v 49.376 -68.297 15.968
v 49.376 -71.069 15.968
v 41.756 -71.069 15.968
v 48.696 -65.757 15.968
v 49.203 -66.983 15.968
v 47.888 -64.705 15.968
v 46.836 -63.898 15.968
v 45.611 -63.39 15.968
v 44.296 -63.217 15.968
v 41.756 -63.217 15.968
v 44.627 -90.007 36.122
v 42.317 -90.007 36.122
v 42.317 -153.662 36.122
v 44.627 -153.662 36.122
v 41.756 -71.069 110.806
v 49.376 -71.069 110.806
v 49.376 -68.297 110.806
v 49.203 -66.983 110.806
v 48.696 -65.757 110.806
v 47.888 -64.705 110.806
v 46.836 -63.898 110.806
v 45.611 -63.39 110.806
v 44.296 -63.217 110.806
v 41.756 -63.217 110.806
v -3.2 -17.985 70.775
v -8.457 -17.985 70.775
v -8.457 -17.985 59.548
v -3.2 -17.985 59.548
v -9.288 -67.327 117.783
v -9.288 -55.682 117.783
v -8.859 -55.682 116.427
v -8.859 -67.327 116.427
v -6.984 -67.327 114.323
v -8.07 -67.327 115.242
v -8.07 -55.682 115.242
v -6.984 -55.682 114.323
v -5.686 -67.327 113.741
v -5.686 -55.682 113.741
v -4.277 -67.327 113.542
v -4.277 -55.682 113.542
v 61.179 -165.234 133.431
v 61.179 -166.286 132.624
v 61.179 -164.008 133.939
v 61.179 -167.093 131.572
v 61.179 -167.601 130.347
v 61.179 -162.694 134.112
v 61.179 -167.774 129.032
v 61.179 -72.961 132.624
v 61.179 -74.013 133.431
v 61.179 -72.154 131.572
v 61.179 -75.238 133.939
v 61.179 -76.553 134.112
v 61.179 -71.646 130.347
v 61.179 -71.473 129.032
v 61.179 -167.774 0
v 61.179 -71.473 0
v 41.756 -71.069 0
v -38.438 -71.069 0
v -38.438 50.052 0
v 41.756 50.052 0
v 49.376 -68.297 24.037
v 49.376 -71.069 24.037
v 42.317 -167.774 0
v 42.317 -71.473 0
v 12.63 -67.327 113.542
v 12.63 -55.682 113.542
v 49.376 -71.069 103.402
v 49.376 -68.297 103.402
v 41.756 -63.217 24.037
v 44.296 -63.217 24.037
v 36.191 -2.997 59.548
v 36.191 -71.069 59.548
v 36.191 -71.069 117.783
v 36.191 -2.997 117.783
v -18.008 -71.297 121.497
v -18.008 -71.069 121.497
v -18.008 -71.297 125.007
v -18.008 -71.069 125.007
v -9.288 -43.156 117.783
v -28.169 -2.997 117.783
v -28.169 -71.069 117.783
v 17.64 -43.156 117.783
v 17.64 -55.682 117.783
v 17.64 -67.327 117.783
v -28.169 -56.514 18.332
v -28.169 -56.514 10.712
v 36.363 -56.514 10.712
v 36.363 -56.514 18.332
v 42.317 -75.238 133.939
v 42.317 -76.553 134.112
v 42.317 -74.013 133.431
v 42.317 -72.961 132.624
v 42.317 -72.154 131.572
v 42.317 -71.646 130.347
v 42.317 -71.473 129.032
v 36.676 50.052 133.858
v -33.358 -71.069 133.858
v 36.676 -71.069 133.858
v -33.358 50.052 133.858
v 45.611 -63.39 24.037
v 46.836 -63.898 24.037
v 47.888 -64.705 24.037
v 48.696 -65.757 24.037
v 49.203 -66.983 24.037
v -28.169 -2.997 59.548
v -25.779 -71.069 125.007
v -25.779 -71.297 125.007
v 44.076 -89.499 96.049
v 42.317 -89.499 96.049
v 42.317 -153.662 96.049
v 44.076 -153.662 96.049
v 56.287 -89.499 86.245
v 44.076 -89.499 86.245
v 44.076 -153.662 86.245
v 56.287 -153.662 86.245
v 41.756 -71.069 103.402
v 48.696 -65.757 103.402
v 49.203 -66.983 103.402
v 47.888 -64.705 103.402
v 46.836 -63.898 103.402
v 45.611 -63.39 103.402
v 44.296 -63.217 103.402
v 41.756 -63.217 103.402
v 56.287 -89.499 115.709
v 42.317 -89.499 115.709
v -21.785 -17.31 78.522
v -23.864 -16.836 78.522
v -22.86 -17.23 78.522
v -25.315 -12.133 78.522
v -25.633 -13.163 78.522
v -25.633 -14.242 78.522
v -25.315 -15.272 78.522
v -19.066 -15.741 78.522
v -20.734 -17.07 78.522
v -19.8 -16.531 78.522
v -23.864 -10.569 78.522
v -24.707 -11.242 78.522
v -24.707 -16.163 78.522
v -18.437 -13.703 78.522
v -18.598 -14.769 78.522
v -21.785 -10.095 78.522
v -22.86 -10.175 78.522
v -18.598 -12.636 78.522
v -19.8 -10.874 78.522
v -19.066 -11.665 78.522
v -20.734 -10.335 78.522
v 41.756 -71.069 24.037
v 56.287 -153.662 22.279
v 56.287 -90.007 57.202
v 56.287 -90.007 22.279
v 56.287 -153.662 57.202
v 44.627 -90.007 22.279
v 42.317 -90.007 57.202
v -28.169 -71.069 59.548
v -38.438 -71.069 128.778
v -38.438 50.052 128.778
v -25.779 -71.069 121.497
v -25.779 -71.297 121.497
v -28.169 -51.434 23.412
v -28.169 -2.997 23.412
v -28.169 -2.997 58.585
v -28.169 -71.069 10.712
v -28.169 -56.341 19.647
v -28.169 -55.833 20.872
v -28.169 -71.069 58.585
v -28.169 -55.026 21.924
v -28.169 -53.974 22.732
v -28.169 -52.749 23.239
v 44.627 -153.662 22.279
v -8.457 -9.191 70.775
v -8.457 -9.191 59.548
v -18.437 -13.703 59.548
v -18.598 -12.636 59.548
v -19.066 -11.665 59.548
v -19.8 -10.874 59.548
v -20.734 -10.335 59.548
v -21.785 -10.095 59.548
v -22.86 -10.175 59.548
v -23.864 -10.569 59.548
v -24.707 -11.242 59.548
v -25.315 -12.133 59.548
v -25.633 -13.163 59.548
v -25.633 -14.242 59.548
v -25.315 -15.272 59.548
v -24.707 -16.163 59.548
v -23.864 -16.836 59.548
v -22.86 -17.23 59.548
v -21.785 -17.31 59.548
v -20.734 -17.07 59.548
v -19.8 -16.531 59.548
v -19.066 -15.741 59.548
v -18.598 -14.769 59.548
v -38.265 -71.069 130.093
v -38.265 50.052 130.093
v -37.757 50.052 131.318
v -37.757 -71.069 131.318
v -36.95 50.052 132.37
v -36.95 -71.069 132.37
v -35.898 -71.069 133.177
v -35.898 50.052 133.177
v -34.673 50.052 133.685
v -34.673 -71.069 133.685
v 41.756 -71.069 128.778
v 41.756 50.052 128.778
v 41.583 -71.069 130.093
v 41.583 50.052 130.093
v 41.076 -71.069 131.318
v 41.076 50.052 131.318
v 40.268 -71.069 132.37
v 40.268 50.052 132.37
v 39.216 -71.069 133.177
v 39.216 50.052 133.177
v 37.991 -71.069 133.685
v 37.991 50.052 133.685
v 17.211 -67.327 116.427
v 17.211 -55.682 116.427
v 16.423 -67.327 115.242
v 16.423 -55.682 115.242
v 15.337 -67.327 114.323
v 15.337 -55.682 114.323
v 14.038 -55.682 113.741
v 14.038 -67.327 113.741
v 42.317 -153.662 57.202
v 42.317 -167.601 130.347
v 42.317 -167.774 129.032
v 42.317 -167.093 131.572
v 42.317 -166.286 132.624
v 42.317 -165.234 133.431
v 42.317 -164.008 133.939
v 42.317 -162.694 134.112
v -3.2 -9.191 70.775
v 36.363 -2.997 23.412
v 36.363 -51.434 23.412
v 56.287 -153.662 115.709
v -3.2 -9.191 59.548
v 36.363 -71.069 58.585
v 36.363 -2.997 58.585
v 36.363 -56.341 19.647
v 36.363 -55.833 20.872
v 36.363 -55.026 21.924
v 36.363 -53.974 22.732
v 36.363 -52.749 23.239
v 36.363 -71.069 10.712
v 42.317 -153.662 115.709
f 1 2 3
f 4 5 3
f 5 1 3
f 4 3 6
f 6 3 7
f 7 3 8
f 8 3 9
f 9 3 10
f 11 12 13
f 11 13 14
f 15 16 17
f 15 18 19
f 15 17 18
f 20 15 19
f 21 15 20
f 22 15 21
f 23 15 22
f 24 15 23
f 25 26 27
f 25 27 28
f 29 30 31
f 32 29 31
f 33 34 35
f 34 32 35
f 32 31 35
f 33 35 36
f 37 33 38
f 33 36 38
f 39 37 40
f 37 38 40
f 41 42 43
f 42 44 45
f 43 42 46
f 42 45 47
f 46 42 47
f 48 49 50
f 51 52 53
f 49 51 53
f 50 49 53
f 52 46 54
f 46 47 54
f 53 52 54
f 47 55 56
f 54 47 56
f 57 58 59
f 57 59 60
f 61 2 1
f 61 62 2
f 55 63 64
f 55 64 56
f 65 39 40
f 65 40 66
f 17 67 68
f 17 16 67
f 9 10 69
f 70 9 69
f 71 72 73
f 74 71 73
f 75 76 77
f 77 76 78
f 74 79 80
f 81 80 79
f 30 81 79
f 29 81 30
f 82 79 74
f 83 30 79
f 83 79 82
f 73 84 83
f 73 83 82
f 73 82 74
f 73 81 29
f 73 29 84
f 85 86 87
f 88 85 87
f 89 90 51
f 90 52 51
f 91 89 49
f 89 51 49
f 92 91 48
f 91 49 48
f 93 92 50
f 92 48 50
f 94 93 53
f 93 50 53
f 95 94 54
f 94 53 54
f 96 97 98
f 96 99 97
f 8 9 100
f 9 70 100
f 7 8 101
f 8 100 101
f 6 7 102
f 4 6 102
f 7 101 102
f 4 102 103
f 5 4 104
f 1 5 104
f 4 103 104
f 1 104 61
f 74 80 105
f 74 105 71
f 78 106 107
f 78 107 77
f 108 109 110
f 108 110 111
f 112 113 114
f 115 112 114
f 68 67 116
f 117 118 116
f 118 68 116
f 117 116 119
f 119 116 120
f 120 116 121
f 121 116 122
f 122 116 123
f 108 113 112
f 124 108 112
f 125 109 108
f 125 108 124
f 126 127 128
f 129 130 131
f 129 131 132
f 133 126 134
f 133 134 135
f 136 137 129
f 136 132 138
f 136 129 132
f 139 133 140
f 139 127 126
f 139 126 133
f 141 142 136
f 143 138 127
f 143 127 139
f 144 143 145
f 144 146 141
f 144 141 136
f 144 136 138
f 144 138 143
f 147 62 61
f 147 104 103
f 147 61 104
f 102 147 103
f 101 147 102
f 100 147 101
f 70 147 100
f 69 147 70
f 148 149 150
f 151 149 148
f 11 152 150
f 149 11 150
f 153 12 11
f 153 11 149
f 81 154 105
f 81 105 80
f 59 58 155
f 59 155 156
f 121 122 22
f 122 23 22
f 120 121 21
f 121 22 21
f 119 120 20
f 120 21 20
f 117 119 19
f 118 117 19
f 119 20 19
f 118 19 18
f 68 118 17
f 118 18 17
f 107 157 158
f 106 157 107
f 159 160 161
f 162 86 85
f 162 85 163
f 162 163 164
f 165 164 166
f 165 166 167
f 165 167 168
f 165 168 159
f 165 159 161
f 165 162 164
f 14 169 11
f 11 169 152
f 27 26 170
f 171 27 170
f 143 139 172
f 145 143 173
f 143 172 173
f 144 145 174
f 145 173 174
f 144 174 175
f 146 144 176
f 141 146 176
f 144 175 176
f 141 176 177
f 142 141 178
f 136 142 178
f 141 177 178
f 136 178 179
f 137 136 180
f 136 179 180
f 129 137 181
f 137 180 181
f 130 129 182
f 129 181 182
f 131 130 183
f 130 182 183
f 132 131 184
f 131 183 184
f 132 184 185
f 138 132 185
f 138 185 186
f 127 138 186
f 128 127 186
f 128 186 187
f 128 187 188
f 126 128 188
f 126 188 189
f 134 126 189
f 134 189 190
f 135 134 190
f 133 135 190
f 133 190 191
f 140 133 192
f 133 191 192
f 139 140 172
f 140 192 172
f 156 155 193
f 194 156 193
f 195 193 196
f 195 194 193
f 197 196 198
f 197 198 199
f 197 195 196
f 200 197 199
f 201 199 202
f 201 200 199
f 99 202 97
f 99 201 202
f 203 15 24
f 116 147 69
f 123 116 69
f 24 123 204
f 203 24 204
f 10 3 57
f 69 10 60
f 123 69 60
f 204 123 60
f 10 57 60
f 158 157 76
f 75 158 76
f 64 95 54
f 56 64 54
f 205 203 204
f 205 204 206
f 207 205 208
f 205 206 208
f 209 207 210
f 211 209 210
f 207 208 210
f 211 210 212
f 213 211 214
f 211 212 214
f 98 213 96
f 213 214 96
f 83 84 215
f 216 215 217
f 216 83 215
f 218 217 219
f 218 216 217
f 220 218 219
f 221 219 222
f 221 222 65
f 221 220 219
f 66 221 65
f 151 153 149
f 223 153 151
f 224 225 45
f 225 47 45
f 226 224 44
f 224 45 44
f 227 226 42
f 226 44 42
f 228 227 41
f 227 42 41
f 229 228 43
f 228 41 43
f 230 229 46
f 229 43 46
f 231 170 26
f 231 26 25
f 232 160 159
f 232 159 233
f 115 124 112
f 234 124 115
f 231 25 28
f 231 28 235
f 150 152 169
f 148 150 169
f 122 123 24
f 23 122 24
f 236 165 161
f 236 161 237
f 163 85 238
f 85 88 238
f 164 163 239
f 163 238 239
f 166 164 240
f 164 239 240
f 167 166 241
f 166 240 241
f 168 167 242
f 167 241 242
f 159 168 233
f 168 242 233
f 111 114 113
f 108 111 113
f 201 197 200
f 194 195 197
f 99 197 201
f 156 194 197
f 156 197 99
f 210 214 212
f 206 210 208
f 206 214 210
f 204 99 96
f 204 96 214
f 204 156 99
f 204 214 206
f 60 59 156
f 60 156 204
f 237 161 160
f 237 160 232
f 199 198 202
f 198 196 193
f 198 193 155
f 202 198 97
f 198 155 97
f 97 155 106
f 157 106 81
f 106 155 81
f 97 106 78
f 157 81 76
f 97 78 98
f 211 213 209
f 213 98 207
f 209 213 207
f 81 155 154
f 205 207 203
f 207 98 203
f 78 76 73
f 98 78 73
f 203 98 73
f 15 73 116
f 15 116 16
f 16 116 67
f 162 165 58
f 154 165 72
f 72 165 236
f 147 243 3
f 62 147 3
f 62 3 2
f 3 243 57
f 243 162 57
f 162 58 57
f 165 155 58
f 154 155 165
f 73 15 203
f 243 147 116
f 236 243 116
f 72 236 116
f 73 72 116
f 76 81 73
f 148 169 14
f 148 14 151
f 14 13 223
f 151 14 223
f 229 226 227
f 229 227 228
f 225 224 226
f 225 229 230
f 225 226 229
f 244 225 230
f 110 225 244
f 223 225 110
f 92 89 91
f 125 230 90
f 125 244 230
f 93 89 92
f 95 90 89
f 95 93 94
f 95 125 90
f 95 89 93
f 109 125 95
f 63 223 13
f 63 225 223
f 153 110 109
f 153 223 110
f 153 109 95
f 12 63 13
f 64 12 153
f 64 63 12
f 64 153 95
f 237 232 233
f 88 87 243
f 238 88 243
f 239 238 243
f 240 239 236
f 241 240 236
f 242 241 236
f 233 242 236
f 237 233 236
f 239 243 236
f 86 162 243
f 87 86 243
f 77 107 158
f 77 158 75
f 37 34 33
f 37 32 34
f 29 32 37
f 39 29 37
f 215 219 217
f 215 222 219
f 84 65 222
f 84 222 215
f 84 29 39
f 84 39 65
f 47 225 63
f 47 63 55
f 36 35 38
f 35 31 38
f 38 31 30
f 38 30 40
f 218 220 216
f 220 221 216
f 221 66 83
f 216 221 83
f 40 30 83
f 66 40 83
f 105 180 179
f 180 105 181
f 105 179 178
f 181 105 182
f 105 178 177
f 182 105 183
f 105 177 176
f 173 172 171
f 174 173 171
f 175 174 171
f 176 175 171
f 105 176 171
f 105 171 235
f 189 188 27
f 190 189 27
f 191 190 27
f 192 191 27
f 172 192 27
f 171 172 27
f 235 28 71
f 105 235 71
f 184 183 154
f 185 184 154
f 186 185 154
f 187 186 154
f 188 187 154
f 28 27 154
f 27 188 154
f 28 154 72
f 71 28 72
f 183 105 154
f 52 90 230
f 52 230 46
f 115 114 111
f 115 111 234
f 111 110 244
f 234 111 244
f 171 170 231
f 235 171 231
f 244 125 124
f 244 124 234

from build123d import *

# Parameters (mm, degrees)
F0_W         = 80.1943540573
F0_H         = 121.1211308837
F1_DEPTH     = 133.858
F2_W         = 18.8613273203
F2_H         = 96.3003262877
F3_DEPTH     = 134.112
F4_W         = 64.1634315252
F4_H         = 29.464147985
F4_W_2       = 63.6551976204
F4_H_2       = 34.9228568375
F5_DEPTH     = 13.97
F6_W         = 1.7585195601
F6_H         = 64.1634315252
F7_DEPTH     = 9.8044
F8_W         = 2.3097619414
F8_H         = 63.6551976204
F9_DEPTH     = 13.843
F10_R        = 5.08
F10_2_R      = 5.08
F11_W        = 7.8514143825
F11_H        = 7.4035450816
F11_H_2      = 8.0685932189
F12_DEPTH    = 7.62
F13_R        = 5.08
F14_W        = 64.35992755
F14_H        = 51.1236339808
F14_W_2      = 64.5319614559
F14_H_2      = 47.8723710403
F15_DEPTH    = 68.072
F16_DEPTH    = 7.112
F17_W        = 28.1689930707
F17_H        = 53.517022583
F17_W_2      = 36.3629683852
F18_DEPTH    = 12.7
F19_R        = 5.08
F20_W        = 7.7713597566
F20_H        = 3.5107582808
F21_DEPTH    = 0.2286
F22_W        = 26.9276434556
F22_H        = 11.6446465254
F23_DEPTH    = 4.2418
F24_T1_DEPTH = 36.6965031233
F25_R        = 3.6178439309
F26_DEPTH    = 18.9738
F27_W        = 5.2568218671
F27_H        = 8.7943524122
F28_DEPTH    = 11.2268


# Not quite as in the source:
# - a fillet or chamfer that OpenCascade refuses, or shapes differently, is made with other operations: its cross-section is extruded or revolved along the edge and cut away or added


with BuildPart() as f1:
    # F0 (on Top) → F1 (new body)
    with BuildSketch(Plane.XY):
        with Locations((1.6591921449, -10.5082280934)):
            Rectangle(F0_W, F0_H)
    extrude(amount=F1_DEPTH)

    # F10
    f10_edges = [f1.edges().sort_by_distance(p)[0] for p in [
        (-38.437985, -10.508228, 133.858),
        (41.756369, -10.508228, 133.858),
    ]]
    fillet(f10_edges, radius=F10_R)

    # F11 (on face) → F12 (join)
    with BuildSketch(Plane.YZ.offset(41.7563691735)):
        with Locations((-67.143086344, 107.1041934192)):
            Rectangle(F11_W, F11_H)
        with Locations((-67.143086344, 20.0026882812)):
            Rectangle(F11_W, F11_H_2)
    extrude(amount=F12_DEPTH)

    # F13
    f13_edges = [f1.edges().sort_by_distance(p)[0] for p in [
        (49.376369, -63.217379, 107.104193),
        (49.376369, -63.217379, 20.002688),
    ]]
    fillet(f13_edges, radius=F13_R)

    # F14 (on face) → F15 (cut)
    with BuildSketch(Plane.XZ.offset(71.0687935352)):
        with Locations((4.0109707043, 92.2216698527)):
            Rectangle(F14_W, F14_H)
        with Locations((4.0969876572, 34.6483555622)):
            Rectangle(F14_W_2, F14_H_2)
    extrude(amount=-F15_DEPTH, mode=Mode.SUBTRACT)

    # F16 (cut): a face of the model
    f16_faces = [f1.faces().sort_by_distance(p)[0] for p in [
        (4.0109707043, -37.0327935352, 66.6598528624),
    ]]
    extrude(f16_faces, amount=-F16_DEPTH, mode=Mode.SUBTRACT)

    # F17 (on face) → F18 (join)
    with BuildSketch(Plane.XY.offset(10.7121700421)):
        with Locations((-14.0844965354, -29.7553048267)):
            Rectangle(F17_W, F17_H)
        with Locations((18.1814841926, -29.7553048267)):
            Rectangle(F17_W_2, F17_H)
    extrude(amount=F18_DEPTH)

    # F19
    f19_edges = [f1.edges().sort_by_distance(p)[0] for p in [
        (4.096988, -56.513816, 23.41217),
    ]]
    fillet(f19_edges, radius=F19_R)

    # F20 (on face) → F21 (join)
    with BuildSketch(Plane.XZ.offset(71.0687935352)):
        with Locations((-21.8933494762, 123.2520565391)):
            Rectangle(F20_W, F20_H)
    extrude(amount=F21_DEPTH)

    # F22 (on face) → F23 (join)
    with BuildSketch(Plane(origin=(0, 0, 117.7834868431), x_dir=(1, 0, 0), z_dir=(0, 0, -1))):
        with Locations((4.1761337779, 61.5042597055)):
            Rectangle(F22_W, F22_H)
    extrude(amount=F23_DEPTH)

    # F24: fillet of radius 5.08 on 2 edges, made by hand

    # F24_s2 → F24_t1 (cut)
    with BuildSketch(Plane.XZ.offset(43.1560081439)):
        with BuildLine():
            ThreePointArc((-9.2876879498, 117.7834868431), (-7.559720018, 114.7445451124), (-4.2773166303, 113.5416868431))
            Line((-4.2773166303, 113.5416868431), (-9.2876879498, 113.5416868431))
            Line((-9.2876879498, 113.5416868431), (-9.2876879498, 117.7834868431))
        make_face()
        with BuildLine():
            ThreePointArc((17.6399555057, 117.7834868431), (15.9119875739, 114.7445451124), (12.6295841862, 113.5416868431))
            Line((12.6295841862, 113.5416868431), (17.6399555057, 113.5416868431))
            Line((17.6399555057, 113.5416868431), (17.6399555057, 117.7834868431))
        make_face()
    extrude(amount=F24_T1_DEPTH, mode=Mode.SUBTRACT)

    # F25 (on face) → F26 (join)
    with BuildSketch(Plane.XY.offset(59.5478528624)):
        with Locations((-22.0553409308, -13.7025229633)):
            Circle(F25_R)
    extrude(amount=F26_DEPTH)

    # F27 (on face) → F28 (join)
    with BuildSketch(Plane.XY.offset(59.5478528624)):
        with Locations((-5.8286509011, -13.5883204639)):
            Rectangle(F27_W, F27_H)
    extrude(amount=F28_DEPTH)


with BuildPart() as f3:
    # F2 (on Top) → F3 (new body)
    with BuildSketch(Plane.XY):
        with Locations((51.7478492111, -119.6234412491)):
            Rectangle(F2_W, F2_H)
    extrude(amount=F3_DEPTH)

    # F4 (on face) → F5 (cut)
    with BuildSketch(Plane(origin=(42.3171855509, 0, 0), x_dir=(0, -1, 0), z_dir=(-1, 0, 0))):
        with Locations((121.580503881, 100.977037102)):
            Rectangle(F4_W, F4_H)
        with Locations((121.8346208334, 39.7402029485)):
            Rectangle(F4_W_2, F4_H_2)
    extrude(amount=-F5_DEPTH, mode=Mode.SUBTRACT)

    # F6 (on face) → F7 (join)
    with BuildSketch(Plane.XY.offset(86.2449631095)):
        with Locations((43.196445331, -121.580503881)):
            Rectangle(F6_W, F6_H)
    extrude(amount=F7_DEPTH)

    # F8 (on face) → F9 (join)
    with BuildSketch(Plane.XY.offset(22.2787745297)):
        with Locations((43.4720665216, -121.8346208334)):
            Rectangle(F8_W, F8_H)
    extrude(amount=F9_DEPTH)

    # F10#2
    f10_2_edges = [f3.edges().sort_by_distance(p)[0] for p in [
        (51.747849, -167.773604, 134.112),
        (51.747849, -71.473278, 134.112),
    ]]
    fillet(f10_2_edges, radius=F10_2_R)


solid = Compound([f1.part, f3.part])
